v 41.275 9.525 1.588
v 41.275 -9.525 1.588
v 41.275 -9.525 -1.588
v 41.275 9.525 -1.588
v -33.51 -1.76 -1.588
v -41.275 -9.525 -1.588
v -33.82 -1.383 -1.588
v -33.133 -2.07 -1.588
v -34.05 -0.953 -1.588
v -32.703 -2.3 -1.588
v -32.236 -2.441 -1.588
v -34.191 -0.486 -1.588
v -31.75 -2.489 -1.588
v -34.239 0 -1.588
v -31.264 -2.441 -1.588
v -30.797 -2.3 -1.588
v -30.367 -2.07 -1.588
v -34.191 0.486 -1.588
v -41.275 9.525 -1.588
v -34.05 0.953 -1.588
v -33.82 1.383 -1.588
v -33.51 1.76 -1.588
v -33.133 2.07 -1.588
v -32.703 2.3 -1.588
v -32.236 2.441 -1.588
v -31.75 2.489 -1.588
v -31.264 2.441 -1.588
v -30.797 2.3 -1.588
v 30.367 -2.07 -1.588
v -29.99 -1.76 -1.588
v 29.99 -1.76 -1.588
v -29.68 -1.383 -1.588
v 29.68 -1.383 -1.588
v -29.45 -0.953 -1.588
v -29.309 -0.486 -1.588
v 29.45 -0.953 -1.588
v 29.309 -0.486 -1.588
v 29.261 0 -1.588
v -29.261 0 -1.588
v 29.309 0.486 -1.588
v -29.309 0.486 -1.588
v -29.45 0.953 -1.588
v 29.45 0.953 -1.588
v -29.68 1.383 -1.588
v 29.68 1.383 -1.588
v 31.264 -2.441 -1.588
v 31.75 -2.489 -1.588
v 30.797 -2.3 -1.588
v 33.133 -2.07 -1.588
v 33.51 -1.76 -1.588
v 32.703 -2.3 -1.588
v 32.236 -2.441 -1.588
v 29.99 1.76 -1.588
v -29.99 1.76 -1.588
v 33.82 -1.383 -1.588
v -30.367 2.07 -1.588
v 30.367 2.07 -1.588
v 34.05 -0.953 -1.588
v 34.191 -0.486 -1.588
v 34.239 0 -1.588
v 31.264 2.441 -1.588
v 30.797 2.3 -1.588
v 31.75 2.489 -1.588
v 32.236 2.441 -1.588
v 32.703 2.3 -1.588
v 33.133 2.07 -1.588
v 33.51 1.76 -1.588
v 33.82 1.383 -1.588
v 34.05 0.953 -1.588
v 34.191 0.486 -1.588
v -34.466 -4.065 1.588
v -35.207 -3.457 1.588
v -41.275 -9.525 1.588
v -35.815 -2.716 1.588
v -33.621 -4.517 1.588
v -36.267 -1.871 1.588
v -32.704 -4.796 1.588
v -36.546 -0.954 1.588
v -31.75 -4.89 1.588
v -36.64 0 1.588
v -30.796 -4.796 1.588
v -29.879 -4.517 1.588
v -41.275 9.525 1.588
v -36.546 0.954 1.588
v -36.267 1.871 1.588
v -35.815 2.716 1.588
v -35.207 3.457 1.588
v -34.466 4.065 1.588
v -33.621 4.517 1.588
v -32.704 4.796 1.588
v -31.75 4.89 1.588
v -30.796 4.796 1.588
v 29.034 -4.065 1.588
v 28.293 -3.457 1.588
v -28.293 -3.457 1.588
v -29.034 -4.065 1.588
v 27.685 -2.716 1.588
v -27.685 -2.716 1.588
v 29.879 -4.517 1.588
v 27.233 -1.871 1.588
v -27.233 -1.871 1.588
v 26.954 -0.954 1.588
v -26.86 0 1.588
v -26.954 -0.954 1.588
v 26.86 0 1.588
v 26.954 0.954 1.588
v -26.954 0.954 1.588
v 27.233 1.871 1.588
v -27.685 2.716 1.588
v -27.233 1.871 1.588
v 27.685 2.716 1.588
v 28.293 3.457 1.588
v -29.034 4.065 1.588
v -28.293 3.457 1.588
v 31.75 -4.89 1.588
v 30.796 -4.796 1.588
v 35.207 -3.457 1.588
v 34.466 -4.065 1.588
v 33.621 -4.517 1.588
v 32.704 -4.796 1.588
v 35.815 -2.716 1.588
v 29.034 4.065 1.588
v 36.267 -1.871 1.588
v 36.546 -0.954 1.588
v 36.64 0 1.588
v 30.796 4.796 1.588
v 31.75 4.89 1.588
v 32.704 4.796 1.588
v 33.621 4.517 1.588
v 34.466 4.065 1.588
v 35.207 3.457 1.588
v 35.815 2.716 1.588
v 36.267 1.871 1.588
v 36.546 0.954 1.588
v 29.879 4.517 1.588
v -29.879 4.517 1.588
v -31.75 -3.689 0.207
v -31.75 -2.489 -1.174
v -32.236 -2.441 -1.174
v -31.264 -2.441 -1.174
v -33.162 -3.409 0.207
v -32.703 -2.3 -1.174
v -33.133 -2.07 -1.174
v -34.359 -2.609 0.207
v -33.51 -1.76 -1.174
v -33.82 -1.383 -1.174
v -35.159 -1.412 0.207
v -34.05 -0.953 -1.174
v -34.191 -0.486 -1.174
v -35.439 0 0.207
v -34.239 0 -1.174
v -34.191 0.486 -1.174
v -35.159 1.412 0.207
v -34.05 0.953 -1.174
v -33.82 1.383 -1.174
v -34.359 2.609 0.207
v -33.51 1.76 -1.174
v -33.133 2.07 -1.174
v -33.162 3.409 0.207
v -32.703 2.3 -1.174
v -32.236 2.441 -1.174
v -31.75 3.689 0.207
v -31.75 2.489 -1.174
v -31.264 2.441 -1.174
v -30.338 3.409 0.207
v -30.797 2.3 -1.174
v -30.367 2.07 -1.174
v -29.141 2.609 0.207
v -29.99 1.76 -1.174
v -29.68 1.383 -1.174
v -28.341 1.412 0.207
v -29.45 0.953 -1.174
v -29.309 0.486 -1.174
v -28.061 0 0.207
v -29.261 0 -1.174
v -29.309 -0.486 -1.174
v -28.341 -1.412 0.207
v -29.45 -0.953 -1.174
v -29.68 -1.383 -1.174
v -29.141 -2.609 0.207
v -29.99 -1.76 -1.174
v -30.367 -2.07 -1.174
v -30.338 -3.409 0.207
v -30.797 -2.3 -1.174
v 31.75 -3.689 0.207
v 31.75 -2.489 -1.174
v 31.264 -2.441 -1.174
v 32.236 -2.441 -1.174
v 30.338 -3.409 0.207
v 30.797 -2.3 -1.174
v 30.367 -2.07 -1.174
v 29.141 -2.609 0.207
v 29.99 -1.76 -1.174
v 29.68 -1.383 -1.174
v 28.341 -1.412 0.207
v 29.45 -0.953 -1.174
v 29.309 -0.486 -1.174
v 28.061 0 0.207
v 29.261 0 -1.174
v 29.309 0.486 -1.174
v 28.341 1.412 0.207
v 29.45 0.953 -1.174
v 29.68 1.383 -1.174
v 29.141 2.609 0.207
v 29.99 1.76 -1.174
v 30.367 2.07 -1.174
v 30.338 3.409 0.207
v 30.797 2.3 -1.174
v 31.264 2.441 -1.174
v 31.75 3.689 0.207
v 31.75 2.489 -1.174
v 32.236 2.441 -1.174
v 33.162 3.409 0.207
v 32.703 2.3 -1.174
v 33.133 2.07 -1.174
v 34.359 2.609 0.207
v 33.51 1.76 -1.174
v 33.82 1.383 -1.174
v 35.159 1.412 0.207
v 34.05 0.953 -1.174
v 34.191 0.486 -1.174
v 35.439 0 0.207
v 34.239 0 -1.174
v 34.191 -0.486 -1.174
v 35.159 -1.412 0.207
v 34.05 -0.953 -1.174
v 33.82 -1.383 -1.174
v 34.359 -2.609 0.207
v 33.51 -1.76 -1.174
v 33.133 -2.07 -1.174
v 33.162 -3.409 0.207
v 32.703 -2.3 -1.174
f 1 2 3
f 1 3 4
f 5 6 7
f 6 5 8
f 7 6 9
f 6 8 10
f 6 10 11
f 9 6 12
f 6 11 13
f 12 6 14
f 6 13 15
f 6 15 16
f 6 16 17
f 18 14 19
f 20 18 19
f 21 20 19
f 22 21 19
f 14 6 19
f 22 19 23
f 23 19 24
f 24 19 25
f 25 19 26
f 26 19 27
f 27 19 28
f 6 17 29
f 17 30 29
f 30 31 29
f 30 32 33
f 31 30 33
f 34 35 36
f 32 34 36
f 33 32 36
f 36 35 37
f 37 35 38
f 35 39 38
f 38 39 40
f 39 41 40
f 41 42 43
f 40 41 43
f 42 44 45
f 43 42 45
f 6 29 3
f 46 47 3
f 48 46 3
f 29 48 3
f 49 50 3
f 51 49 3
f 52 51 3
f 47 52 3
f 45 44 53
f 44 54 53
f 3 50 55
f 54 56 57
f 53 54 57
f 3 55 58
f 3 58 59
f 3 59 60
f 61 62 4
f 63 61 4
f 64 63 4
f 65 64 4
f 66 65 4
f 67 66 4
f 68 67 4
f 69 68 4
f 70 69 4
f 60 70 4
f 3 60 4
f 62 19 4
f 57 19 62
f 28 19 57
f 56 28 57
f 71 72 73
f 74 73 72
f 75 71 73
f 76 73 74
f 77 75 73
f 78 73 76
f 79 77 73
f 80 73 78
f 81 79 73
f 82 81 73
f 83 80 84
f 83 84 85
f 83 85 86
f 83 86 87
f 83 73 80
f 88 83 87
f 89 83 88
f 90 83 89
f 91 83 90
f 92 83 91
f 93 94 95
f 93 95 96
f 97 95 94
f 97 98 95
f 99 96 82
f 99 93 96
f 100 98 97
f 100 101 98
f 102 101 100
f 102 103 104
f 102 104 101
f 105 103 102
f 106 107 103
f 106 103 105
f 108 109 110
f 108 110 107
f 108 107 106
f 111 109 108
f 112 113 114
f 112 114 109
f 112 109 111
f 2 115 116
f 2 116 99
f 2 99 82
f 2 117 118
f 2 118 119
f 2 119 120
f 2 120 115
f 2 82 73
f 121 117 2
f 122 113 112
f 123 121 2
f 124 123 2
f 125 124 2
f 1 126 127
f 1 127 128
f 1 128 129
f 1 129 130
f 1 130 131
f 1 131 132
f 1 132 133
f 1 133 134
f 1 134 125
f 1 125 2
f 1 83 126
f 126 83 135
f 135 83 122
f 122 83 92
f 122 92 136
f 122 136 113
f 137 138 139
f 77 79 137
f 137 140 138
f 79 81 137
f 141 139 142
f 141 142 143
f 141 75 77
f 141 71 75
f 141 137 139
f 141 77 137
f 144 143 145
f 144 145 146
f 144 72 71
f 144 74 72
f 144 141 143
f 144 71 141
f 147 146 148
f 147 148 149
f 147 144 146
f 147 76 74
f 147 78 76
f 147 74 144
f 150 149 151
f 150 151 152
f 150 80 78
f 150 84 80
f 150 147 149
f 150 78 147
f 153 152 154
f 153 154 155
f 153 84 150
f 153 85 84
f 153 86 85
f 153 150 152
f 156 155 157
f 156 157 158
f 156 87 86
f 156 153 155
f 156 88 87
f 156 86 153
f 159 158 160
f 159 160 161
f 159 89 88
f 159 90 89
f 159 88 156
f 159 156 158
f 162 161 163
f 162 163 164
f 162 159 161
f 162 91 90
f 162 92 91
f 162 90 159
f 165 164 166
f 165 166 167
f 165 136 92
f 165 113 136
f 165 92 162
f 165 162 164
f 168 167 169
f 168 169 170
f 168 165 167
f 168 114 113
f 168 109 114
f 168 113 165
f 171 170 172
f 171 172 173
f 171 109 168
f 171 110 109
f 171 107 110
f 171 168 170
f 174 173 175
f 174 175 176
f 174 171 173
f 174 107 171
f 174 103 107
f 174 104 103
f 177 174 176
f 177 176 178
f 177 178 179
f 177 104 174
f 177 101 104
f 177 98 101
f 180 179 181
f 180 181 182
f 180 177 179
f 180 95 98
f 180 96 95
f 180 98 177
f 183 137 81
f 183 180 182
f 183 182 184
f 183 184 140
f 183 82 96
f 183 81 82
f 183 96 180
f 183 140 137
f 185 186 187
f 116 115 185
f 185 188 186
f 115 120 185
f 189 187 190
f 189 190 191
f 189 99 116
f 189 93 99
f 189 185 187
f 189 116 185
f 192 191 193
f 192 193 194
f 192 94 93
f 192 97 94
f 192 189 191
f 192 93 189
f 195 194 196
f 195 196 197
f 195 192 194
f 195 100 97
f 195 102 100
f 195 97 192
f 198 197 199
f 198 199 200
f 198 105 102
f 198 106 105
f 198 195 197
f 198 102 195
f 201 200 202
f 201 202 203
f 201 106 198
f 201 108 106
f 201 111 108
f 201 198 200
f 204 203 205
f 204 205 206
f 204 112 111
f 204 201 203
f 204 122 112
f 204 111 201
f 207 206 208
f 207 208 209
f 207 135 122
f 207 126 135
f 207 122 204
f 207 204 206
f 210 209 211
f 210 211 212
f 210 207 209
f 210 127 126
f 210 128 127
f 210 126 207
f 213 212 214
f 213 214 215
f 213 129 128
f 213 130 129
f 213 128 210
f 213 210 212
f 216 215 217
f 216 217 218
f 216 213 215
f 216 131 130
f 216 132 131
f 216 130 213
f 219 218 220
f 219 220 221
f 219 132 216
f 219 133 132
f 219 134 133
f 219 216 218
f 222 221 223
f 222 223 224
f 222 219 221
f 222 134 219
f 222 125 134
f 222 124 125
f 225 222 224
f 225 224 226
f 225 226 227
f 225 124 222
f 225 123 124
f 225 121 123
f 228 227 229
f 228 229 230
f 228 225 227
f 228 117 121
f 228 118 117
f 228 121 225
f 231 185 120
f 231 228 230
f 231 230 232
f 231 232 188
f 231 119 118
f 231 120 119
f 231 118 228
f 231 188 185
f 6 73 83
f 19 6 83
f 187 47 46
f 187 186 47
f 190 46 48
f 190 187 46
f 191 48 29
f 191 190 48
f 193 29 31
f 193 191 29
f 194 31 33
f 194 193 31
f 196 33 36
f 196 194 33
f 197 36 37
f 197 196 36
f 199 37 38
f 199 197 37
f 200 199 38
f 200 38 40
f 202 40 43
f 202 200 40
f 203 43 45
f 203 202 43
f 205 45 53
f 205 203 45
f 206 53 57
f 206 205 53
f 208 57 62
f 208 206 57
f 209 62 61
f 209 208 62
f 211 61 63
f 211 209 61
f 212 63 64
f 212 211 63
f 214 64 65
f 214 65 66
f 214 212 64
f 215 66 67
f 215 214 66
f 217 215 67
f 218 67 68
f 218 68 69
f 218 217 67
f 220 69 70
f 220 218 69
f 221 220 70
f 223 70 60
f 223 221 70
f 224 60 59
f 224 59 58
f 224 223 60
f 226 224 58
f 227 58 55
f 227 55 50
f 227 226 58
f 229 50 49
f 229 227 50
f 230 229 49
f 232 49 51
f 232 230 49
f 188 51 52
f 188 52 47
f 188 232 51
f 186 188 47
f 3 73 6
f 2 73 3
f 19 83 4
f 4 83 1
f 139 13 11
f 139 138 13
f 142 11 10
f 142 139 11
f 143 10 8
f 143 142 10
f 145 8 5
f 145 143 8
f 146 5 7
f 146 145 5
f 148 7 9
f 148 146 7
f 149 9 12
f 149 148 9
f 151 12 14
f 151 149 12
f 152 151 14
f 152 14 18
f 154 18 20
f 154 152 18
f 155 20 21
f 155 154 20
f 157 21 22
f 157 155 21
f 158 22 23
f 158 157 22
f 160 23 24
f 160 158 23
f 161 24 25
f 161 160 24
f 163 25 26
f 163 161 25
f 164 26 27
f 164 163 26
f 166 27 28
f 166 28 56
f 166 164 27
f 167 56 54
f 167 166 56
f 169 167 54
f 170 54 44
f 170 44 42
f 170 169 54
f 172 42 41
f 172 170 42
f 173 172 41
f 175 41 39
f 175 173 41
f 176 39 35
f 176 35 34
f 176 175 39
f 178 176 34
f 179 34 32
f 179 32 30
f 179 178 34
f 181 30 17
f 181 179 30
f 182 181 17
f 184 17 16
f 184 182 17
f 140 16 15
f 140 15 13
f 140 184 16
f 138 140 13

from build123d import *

# Parameters (mm, degrees)
SKETCH1_W                                    = 82.55
SKETCH1_H                                    = 19.05
EXTRUDE1_DEPTH                               = 1.5875
CSK_FOR_10_FLAT_HEAD_MACHINE_SCREW1_AT_COUNT = 2
CSK_FOR_10_FLAT_HEAD_MACHINE_SCREW1_AT_PITCH = 63.5


with BuildPart() as part:
    # Sketch1 → Extrude1 (new body, symmetric)
    with BuildSketch(Plane.XY):
        Rectangle(SKETCH1_W, SKETCH1_H)
    extrude(amount=EXTRUDE1_DEPTH, both=True)

    # Sketch2 → CSK for #10 Flat Head Machine Screw1 (revolve, cut)
    with BuildSketch(Plane(origin=(-31.75, 0, 1.5875), x_dir=(0, -1, 0), z_dir=(1, 0, 0))):
        Polygon((0, 0), (0, 3.175), (2.4892, 3.175), (2.4892, 2.761229288), (4.8895, 0), align=None)
    csk_for_10_flat_head_machine_screw1 = revolve(axis=Axis((-31.75, 0, 7.9375), (0, 0, -1)), mode=Mode.SUBTRACT)

    # CSK for #10 Flat Head Machine Screw1 at: CSK for #10 Flat Head Machine Screw1 ×2
    with Locations(*[(i * CSK_FOR_10_FLAT_HEAD_MACHINE_SCREW1_AT_PITCH, 0, 0) for i in range(1, CSK_FOR_10_FLAT_HEAD_MACHINE_SCREW1_AT_COUNT)]):
        add(csk_for_10_flat_head_machine_screw1, mode=Mode.SUBTRACT)


solid = part.part
